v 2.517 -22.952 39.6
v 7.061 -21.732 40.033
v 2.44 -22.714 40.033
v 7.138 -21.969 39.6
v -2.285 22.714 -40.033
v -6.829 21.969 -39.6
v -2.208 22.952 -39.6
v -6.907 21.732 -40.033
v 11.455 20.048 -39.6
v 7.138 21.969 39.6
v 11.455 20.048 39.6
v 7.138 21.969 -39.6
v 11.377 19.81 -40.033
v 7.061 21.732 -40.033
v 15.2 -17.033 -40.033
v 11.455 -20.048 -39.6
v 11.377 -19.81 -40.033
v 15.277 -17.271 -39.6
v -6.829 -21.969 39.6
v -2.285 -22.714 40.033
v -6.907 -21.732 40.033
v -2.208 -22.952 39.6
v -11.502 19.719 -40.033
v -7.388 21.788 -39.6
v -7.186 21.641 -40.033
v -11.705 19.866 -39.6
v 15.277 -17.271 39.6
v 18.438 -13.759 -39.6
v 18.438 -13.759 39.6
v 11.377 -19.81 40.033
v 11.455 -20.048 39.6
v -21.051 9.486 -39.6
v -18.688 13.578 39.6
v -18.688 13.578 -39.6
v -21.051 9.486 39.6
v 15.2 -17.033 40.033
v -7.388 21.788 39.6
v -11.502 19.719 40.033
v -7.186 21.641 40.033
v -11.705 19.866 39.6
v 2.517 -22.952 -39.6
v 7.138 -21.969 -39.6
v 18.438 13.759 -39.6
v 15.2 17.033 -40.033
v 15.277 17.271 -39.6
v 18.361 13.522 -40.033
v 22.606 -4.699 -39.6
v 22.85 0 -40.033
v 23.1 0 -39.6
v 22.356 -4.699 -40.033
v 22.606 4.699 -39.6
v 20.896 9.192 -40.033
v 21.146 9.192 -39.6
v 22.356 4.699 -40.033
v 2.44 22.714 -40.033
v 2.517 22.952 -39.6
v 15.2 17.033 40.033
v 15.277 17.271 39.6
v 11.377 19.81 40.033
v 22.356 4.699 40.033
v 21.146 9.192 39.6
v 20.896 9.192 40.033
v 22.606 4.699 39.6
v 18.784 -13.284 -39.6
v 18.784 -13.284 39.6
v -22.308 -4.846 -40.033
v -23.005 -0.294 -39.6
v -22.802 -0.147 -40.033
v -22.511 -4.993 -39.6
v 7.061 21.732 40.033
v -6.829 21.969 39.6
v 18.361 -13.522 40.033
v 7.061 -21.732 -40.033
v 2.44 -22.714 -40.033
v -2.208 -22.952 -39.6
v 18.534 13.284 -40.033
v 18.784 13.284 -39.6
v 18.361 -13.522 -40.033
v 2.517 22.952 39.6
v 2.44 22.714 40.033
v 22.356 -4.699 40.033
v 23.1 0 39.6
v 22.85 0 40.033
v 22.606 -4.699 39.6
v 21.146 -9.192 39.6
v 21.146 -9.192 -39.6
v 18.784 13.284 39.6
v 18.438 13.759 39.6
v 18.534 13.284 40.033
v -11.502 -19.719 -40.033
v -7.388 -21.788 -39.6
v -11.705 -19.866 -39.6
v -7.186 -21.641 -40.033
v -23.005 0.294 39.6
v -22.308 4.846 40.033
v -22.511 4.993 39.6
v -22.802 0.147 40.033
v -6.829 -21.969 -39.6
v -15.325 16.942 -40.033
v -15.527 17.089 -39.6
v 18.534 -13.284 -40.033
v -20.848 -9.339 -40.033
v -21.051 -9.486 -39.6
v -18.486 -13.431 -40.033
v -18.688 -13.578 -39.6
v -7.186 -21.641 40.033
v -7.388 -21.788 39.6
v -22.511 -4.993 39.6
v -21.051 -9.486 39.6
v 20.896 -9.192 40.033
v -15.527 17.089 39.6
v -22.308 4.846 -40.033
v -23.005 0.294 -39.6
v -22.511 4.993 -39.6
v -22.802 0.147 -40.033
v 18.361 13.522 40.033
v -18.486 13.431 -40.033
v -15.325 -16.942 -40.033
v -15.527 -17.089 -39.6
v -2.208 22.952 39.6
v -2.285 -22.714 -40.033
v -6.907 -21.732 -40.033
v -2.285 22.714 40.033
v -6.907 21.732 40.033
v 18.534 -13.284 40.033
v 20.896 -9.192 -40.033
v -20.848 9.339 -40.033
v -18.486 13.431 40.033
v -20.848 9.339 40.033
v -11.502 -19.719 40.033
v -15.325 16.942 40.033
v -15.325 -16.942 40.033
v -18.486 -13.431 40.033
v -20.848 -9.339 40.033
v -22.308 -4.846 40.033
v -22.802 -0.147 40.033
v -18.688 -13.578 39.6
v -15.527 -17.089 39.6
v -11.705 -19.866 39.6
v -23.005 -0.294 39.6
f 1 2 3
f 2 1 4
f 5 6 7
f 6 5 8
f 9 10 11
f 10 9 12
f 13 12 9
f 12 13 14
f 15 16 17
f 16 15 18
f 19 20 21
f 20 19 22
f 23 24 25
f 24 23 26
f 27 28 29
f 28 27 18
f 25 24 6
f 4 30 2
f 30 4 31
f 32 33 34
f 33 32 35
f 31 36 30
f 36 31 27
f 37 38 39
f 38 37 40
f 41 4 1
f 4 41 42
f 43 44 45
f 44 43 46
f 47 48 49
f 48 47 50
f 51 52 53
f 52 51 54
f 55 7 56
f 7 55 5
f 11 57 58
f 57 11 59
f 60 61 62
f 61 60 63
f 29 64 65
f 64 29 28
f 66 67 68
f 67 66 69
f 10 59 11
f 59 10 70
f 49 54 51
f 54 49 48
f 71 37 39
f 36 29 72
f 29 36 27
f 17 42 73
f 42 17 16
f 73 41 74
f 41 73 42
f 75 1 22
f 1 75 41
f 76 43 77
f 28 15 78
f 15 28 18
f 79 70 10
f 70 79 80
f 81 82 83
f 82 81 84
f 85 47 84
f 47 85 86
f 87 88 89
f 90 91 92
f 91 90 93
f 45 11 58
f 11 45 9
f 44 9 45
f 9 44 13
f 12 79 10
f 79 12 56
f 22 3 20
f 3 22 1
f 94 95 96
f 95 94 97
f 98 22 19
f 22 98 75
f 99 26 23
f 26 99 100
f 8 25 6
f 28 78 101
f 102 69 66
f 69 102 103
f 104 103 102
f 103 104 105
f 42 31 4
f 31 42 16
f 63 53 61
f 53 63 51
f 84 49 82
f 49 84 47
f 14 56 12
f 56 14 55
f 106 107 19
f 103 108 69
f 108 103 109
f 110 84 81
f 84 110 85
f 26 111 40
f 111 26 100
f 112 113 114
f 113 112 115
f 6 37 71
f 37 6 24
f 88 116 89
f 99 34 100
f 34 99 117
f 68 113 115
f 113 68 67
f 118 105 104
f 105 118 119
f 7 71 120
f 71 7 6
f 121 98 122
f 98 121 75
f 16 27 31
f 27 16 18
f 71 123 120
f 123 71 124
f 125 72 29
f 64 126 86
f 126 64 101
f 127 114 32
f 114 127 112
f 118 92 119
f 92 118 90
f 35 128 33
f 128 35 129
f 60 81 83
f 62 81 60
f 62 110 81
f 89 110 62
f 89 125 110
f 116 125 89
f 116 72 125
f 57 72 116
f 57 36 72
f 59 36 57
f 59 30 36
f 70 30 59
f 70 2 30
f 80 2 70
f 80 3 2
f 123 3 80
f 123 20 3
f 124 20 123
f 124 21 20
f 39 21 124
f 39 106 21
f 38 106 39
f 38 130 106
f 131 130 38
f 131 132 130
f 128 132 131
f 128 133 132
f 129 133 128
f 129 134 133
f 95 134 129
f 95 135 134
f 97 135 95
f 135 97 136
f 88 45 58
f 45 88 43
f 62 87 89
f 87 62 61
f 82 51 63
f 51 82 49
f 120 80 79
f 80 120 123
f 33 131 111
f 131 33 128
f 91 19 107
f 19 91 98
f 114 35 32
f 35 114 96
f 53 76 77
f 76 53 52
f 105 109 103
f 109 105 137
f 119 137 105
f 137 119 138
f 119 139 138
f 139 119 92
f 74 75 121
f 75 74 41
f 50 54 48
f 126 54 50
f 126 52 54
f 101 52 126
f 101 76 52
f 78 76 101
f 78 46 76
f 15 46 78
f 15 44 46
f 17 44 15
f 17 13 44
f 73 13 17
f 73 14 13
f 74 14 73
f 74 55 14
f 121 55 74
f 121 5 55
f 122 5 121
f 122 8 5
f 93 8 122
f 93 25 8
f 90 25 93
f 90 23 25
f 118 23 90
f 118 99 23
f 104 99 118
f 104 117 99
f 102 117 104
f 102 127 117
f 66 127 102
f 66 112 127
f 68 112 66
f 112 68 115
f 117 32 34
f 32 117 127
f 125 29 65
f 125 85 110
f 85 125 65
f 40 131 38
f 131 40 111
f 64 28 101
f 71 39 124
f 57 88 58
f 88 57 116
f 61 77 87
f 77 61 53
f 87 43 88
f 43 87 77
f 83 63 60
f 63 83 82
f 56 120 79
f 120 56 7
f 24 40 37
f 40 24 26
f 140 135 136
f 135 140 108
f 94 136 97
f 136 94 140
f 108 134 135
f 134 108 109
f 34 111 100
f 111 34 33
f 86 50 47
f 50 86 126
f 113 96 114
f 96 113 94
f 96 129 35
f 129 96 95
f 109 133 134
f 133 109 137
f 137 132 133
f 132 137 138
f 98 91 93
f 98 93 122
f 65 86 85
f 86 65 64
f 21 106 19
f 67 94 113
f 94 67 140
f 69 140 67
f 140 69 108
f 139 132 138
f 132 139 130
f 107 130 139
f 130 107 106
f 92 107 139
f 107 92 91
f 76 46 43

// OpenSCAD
// Parameters
height_mm = 80.2; //[40.1:160.4:0.1]
diameter_mm = 46.2; //[23.1:92.4:0.1]
positive_terminal_diameter_mm = 12; //[6:24:0.1]
positive_terminal_height_mm = 1.5; //[0.75:3:0.05]
negative_terminal_diameter_mm = 10; //[5:20:0.1]
negative_terminal_height_mm = 0.3; //[0.15:0.6:0.05]
edge_fillet_radius_mm = 0.5; //[0.25:1:0.05]
terminal_overlap_mm = 0.8; //[0.5:2:0.1]

// Battery - complete geometry
module battery() {
  color("DimGray") {
    // Cylindrical cell body with edge fillet
    minkowski() {
      cylinder(
        r=diameter_mm/2 - edge_fillet_radius_mm, 
        h=height_mm - 2*edge_fillet_radius_mm, 
        center=true
      );
      sphere(r=edge_fillet_radius_mm, center=true);
    }
    
    // Positive terminal button
    translate([0, 0, height_mm/2 - positive_terminal_height_mm/2 - terminal_overlap_mm])
      cylinder(
        r=positive_terminal_diameter_mm/2, 
        h=positive_terminal_height_mm, 
        center=true
      );
    
    // Negative terminal contact
    translate([0, 0, -height_mm/2 + negative_terminal_height_mm/2 + terminal_overlap_mm])
      cylinder(
        r=negative_terminal_diameter_mm/2, 
        h=negative_terminal_height_mm, 
        center=true
      );
  }
}

// Assembly
module assembly() {
  battery();
}

assembly();
